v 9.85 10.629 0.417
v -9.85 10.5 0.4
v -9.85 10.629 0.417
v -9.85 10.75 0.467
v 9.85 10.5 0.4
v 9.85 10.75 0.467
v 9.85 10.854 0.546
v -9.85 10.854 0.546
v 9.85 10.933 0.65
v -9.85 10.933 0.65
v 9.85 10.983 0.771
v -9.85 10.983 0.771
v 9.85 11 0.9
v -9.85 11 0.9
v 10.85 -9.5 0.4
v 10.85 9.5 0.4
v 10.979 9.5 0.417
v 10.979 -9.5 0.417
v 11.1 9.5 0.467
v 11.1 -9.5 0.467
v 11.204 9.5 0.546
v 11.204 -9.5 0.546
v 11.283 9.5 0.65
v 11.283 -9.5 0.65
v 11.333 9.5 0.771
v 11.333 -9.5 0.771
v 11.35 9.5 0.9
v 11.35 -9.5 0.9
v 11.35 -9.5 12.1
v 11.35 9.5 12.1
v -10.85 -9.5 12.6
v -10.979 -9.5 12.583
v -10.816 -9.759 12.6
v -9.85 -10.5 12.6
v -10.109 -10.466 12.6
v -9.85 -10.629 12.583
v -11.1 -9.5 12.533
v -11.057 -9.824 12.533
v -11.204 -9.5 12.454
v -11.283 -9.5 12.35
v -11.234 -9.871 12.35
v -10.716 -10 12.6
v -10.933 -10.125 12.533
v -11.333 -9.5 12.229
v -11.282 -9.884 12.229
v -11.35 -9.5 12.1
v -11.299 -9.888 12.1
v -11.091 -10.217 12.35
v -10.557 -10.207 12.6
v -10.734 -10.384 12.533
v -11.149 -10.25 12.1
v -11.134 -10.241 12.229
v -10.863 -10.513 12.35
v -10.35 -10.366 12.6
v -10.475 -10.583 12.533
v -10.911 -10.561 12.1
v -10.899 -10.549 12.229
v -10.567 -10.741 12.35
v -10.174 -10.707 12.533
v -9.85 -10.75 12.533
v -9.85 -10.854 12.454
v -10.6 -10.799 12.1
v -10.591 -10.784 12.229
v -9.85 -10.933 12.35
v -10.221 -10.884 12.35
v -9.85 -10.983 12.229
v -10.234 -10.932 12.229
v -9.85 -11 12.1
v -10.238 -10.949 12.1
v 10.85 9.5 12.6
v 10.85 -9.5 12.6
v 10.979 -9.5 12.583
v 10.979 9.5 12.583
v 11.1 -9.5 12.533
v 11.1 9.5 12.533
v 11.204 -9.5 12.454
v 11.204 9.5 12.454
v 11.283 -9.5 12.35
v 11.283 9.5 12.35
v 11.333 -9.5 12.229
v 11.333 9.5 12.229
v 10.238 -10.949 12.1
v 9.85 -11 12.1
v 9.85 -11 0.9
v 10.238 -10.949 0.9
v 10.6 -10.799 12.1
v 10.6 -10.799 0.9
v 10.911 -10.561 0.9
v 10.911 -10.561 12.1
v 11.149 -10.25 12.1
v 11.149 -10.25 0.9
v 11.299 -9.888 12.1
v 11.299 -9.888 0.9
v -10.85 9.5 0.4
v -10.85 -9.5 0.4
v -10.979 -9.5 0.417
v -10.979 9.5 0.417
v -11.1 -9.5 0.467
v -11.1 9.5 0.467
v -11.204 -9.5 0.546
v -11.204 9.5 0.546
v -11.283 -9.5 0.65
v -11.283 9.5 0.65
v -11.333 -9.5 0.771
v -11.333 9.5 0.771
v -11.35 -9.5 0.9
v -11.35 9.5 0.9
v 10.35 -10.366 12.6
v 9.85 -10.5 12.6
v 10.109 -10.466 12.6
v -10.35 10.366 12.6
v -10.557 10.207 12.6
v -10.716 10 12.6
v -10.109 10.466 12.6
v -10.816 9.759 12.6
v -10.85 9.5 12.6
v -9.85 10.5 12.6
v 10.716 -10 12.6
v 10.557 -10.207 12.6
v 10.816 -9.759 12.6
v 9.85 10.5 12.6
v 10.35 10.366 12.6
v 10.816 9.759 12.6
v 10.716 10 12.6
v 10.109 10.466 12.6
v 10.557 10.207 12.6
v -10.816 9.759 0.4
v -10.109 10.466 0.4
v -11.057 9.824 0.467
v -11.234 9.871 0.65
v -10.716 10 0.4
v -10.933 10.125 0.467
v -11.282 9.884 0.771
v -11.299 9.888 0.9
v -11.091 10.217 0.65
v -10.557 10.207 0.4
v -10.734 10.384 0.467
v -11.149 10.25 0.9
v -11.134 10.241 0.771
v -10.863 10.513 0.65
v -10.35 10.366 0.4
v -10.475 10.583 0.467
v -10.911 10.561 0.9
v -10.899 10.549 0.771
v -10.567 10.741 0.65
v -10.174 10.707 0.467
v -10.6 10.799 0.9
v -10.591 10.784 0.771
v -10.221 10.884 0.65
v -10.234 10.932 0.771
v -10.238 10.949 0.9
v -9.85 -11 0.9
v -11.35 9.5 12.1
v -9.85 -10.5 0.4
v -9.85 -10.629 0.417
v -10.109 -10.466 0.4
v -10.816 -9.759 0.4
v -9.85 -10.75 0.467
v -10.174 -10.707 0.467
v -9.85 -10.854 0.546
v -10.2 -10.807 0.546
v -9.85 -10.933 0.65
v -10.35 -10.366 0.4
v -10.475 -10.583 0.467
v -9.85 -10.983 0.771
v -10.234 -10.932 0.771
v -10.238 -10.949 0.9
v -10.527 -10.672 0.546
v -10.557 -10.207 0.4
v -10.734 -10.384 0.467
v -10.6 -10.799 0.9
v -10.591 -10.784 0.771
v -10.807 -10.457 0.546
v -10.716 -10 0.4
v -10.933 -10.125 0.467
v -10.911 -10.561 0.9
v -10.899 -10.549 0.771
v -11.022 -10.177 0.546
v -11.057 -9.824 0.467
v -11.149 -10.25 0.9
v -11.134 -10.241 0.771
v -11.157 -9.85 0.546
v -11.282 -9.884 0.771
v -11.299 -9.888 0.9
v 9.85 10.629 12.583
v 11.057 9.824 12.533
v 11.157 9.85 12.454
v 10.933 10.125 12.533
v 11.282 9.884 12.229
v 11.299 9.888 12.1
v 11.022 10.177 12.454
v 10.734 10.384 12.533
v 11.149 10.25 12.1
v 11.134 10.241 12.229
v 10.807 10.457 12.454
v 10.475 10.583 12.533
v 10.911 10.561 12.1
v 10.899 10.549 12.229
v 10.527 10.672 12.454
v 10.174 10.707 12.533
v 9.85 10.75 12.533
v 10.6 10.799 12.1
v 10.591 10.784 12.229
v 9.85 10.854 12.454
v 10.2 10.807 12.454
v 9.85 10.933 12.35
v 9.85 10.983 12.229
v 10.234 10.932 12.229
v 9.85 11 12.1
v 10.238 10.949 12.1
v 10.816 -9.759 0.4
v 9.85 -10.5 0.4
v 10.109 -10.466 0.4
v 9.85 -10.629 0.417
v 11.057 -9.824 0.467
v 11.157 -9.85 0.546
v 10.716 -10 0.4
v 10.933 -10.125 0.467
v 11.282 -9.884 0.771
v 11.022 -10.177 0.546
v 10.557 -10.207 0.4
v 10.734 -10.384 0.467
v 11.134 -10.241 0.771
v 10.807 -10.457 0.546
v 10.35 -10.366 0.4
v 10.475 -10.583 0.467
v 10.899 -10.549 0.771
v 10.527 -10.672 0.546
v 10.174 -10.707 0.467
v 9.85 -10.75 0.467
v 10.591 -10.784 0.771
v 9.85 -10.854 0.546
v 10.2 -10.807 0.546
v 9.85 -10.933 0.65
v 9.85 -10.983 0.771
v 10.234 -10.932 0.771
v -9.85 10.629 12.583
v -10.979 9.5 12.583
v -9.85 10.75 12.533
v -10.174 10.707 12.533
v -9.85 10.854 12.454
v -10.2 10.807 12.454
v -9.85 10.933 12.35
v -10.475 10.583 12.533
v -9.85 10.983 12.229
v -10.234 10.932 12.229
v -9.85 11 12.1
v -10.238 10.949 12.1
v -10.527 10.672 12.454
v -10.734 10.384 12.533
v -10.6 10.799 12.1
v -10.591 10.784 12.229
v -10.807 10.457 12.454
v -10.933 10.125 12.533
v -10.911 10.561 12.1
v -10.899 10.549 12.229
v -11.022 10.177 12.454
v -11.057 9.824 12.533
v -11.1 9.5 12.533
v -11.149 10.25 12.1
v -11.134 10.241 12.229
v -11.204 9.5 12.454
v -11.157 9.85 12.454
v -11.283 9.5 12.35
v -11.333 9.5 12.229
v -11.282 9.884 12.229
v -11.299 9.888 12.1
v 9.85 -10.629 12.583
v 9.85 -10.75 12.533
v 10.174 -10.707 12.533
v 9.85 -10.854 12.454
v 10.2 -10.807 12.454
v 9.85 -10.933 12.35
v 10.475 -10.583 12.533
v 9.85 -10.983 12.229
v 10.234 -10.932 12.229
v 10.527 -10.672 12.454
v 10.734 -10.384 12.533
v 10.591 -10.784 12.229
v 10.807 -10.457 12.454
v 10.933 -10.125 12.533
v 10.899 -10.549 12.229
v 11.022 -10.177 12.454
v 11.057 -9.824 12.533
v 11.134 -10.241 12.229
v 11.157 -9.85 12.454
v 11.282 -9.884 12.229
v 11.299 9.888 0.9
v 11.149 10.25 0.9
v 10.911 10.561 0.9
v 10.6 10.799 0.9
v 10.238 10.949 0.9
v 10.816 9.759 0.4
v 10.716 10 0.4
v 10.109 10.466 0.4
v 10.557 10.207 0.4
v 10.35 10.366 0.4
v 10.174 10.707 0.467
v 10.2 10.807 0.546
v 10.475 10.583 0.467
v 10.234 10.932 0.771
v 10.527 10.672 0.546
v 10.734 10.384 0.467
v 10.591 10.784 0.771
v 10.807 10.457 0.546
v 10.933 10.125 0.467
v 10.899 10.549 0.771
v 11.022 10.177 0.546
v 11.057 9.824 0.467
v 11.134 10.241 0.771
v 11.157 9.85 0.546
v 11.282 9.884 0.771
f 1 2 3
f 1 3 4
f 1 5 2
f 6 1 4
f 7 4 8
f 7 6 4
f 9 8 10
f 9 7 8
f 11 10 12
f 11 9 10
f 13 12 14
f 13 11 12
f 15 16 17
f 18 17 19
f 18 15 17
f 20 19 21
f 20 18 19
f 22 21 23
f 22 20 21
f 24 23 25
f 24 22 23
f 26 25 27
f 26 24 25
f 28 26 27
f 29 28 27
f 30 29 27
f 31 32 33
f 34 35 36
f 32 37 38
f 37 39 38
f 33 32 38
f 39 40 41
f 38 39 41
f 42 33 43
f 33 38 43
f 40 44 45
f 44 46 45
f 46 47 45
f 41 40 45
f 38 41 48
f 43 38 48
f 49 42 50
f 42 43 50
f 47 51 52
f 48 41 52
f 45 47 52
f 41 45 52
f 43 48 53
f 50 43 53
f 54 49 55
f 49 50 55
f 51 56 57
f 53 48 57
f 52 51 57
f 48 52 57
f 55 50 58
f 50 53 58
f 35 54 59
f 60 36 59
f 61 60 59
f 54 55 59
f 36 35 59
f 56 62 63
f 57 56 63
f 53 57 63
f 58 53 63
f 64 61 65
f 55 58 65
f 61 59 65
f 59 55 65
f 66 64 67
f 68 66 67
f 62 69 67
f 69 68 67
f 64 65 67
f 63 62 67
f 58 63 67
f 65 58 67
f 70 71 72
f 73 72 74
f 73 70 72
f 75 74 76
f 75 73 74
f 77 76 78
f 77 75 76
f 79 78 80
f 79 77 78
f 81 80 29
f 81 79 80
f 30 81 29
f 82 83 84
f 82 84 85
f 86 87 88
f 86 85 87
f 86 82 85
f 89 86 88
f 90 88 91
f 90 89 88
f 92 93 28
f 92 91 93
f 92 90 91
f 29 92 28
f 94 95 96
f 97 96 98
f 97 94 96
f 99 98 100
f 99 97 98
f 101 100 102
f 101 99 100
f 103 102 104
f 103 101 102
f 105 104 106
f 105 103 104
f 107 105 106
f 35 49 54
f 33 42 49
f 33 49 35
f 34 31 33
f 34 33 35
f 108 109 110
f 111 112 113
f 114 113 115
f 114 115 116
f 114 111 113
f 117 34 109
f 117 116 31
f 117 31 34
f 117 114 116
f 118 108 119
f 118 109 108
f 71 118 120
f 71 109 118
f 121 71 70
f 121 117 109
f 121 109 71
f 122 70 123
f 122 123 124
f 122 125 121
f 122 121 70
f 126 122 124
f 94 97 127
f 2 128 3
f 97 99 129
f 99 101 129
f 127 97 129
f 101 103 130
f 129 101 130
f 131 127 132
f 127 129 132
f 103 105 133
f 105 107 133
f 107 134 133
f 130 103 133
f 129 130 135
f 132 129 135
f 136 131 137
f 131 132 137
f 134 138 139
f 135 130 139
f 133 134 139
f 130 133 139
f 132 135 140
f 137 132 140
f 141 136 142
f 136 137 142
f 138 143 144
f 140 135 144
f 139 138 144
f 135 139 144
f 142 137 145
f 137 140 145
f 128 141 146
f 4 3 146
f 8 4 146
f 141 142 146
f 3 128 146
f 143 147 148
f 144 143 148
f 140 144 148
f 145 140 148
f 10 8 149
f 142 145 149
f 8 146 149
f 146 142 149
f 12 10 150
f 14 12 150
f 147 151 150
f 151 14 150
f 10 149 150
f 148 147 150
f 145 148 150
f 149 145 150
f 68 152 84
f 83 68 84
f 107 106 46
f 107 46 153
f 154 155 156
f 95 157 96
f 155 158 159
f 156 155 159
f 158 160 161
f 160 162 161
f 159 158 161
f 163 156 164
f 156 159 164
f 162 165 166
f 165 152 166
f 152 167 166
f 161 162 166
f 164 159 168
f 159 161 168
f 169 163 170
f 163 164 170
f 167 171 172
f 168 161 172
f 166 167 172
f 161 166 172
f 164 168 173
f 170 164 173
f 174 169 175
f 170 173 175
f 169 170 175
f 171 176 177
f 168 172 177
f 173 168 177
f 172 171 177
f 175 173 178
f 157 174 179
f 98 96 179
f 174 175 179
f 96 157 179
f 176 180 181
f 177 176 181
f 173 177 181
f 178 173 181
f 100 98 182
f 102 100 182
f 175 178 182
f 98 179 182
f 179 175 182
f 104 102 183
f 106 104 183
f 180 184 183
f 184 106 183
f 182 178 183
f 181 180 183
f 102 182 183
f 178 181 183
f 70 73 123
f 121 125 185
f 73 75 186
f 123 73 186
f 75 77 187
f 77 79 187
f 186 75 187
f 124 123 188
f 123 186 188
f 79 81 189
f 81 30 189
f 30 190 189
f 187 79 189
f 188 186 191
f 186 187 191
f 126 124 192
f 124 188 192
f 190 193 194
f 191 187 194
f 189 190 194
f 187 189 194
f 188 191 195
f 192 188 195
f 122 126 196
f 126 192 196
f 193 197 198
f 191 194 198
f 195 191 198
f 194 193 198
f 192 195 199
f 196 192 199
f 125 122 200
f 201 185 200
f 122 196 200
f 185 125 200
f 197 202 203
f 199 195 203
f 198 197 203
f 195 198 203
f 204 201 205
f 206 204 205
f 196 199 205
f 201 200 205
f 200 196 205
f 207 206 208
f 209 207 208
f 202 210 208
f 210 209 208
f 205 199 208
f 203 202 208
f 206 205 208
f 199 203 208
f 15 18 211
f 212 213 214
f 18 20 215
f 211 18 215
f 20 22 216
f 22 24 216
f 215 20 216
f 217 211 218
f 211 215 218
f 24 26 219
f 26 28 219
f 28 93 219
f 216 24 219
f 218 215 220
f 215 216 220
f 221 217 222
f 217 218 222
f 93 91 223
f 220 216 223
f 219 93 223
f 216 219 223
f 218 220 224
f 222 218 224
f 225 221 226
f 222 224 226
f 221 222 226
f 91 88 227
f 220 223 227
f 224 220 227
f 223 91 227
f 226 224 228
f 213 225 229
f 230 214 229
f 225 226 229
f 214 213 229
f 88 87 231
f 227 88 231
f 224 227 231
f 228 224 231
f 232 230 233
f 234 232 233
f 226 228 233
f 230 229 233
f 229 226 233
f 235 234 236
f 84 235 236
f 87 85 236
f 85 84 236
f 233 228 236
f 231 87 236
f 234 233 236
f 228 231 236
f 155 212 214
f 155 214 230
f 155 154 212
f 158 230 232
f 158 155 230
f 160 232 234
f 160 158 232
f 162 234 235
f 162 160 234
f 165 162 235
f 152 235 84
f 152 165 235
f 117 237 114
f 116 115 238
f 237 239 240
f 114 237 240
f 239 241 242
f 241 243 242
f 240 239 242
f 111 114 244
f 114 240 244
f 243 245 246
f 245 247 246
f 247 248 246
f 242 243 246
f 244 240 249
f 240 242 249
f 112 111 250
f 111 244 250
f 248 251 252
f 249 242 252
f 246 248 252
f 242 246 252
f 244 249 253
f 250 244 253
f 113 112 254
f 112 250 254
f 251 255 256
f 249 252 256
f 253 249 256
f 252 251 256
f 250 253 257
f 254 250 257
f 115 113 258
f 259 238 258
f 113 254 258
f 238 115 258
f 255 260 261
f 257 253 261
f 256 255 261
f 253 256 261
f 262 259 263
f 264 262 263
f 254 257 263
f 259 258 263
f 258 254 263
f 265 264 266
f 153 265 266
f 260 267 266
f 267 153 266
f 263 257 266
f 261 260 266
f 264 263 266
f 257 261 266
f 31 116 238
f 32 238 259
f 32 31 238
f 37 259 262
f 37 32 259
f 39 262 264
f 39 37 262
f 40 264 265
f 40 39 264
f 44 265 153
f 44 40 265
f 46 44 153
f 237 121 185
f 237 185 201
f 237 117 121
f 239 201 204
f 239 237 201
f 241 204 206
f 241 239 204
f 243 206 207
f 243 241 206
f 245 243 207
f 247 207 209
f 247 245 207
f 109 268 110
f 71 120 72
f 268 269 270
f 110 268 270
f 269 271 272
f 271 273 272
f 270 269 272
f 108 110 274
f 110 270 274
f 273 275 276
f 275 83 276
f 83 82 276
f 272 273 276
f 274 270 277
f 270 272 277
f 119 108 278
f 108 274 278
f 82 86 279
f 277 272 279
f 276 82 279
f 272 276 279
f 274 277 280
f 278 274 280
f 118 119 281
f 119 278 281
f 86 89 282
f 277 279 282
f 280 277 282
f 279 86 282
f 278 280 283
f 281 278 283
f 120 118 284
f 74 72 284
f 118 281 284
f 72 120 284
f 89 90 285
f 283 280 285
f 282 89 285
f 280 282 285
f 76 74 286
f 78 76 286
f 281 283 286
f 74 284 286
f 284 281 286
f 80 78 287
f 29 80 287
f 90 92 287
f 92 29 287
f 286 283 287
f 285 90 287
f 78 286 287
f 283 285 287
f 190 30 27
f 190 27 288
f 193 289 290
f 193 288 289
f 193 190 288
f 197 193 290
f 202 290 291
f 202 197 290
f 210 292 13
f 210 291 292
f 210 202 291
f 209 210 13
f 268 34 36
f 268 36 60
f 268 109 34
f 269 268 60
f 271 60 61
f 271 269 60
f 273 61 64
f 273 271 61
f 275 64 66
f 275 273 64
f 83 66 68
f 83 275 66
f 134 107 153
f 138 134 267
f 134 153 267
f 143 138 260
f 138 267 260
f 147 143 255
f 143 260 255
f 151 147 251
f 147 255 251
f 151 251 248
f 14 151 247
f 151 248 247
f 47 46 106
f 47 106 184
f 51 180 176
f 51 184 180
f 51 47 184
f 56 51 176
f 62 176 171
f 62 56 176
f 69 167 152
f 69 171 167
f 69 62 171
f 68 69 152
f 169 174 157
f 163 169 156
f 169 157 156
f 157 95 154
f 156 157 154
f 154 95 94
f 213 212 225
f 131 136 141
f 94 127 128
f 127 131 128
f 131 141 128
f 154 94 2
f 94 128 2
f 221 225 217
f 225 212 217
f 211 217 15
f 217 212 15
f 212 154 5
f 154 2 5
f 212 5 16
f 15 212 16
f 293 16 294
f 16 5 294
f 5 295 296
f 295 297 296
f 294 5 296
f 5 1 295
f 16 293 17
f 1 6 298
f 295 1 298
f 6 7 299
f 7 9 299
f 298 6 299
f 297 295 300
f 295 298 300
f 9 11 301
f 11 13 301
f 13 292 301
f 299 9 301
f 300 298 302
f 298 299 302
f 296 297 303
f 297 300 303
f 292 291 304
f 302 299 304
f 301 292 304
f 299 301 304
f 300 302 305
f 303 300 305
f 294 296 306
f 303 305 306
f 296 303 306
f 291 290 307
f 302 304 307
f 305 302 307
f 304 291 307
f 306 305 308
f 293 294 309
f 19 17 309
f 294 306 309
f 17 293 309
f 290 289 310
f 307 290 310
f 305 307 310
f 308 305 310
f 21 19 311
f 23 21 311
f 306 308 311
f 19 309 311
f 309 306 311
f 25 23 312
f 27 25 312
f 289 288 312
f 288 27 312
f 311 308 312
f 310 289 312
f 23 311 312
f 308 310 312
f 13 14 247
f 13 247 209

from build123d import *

# Parameters (mm, degrees)
SKETCH_W    = 22.7
SKETCH_H    = 22
PAD_DEPTH   = 12.2
FILLET_R    = 1.5
FILLET001_R = 0.5
FILLET002_R = 0.5


with BuildPart() as part:
    # Sketch → Pad (new body)
    with BuildSketch(Plane.XY):
        Rectangle(SKETCH_W, SKETCH_H)
    extrude(amount=PAD_DEPTH)

    # Fillet
    fillet_edges = [part.edges().sort_by_distance(p)[0] for p in [
        (11.35, -11, 6.1),
        (-11.35, -11, 6.1),
        (11.35, 11, 6.1),
        (-11.35, 11, 6.1),
    ]]
    fillet(fillet_edges, radius=FILLET_R)

    # Fillet001
    fillet001_edges = [part.edges().sort_by_distance(p)[0] for p in [
        (0, -11, 12.2),
    ]]
    fillet(fillet001_edges, radius=FILLET001_R)

    # Fillet002
    fillet002_edges = [part.edges().sort_by_distance(p)[0] for p in [
        (0, 11, 0),
    ]]
    fillet(fillet002_edges, radius=FILLET002_R)


with BuildPart() as part_1:
    # Body placement: moved
    add(part.part.moved(Location((0, 0, 0.4))))


solid = part_1.part
